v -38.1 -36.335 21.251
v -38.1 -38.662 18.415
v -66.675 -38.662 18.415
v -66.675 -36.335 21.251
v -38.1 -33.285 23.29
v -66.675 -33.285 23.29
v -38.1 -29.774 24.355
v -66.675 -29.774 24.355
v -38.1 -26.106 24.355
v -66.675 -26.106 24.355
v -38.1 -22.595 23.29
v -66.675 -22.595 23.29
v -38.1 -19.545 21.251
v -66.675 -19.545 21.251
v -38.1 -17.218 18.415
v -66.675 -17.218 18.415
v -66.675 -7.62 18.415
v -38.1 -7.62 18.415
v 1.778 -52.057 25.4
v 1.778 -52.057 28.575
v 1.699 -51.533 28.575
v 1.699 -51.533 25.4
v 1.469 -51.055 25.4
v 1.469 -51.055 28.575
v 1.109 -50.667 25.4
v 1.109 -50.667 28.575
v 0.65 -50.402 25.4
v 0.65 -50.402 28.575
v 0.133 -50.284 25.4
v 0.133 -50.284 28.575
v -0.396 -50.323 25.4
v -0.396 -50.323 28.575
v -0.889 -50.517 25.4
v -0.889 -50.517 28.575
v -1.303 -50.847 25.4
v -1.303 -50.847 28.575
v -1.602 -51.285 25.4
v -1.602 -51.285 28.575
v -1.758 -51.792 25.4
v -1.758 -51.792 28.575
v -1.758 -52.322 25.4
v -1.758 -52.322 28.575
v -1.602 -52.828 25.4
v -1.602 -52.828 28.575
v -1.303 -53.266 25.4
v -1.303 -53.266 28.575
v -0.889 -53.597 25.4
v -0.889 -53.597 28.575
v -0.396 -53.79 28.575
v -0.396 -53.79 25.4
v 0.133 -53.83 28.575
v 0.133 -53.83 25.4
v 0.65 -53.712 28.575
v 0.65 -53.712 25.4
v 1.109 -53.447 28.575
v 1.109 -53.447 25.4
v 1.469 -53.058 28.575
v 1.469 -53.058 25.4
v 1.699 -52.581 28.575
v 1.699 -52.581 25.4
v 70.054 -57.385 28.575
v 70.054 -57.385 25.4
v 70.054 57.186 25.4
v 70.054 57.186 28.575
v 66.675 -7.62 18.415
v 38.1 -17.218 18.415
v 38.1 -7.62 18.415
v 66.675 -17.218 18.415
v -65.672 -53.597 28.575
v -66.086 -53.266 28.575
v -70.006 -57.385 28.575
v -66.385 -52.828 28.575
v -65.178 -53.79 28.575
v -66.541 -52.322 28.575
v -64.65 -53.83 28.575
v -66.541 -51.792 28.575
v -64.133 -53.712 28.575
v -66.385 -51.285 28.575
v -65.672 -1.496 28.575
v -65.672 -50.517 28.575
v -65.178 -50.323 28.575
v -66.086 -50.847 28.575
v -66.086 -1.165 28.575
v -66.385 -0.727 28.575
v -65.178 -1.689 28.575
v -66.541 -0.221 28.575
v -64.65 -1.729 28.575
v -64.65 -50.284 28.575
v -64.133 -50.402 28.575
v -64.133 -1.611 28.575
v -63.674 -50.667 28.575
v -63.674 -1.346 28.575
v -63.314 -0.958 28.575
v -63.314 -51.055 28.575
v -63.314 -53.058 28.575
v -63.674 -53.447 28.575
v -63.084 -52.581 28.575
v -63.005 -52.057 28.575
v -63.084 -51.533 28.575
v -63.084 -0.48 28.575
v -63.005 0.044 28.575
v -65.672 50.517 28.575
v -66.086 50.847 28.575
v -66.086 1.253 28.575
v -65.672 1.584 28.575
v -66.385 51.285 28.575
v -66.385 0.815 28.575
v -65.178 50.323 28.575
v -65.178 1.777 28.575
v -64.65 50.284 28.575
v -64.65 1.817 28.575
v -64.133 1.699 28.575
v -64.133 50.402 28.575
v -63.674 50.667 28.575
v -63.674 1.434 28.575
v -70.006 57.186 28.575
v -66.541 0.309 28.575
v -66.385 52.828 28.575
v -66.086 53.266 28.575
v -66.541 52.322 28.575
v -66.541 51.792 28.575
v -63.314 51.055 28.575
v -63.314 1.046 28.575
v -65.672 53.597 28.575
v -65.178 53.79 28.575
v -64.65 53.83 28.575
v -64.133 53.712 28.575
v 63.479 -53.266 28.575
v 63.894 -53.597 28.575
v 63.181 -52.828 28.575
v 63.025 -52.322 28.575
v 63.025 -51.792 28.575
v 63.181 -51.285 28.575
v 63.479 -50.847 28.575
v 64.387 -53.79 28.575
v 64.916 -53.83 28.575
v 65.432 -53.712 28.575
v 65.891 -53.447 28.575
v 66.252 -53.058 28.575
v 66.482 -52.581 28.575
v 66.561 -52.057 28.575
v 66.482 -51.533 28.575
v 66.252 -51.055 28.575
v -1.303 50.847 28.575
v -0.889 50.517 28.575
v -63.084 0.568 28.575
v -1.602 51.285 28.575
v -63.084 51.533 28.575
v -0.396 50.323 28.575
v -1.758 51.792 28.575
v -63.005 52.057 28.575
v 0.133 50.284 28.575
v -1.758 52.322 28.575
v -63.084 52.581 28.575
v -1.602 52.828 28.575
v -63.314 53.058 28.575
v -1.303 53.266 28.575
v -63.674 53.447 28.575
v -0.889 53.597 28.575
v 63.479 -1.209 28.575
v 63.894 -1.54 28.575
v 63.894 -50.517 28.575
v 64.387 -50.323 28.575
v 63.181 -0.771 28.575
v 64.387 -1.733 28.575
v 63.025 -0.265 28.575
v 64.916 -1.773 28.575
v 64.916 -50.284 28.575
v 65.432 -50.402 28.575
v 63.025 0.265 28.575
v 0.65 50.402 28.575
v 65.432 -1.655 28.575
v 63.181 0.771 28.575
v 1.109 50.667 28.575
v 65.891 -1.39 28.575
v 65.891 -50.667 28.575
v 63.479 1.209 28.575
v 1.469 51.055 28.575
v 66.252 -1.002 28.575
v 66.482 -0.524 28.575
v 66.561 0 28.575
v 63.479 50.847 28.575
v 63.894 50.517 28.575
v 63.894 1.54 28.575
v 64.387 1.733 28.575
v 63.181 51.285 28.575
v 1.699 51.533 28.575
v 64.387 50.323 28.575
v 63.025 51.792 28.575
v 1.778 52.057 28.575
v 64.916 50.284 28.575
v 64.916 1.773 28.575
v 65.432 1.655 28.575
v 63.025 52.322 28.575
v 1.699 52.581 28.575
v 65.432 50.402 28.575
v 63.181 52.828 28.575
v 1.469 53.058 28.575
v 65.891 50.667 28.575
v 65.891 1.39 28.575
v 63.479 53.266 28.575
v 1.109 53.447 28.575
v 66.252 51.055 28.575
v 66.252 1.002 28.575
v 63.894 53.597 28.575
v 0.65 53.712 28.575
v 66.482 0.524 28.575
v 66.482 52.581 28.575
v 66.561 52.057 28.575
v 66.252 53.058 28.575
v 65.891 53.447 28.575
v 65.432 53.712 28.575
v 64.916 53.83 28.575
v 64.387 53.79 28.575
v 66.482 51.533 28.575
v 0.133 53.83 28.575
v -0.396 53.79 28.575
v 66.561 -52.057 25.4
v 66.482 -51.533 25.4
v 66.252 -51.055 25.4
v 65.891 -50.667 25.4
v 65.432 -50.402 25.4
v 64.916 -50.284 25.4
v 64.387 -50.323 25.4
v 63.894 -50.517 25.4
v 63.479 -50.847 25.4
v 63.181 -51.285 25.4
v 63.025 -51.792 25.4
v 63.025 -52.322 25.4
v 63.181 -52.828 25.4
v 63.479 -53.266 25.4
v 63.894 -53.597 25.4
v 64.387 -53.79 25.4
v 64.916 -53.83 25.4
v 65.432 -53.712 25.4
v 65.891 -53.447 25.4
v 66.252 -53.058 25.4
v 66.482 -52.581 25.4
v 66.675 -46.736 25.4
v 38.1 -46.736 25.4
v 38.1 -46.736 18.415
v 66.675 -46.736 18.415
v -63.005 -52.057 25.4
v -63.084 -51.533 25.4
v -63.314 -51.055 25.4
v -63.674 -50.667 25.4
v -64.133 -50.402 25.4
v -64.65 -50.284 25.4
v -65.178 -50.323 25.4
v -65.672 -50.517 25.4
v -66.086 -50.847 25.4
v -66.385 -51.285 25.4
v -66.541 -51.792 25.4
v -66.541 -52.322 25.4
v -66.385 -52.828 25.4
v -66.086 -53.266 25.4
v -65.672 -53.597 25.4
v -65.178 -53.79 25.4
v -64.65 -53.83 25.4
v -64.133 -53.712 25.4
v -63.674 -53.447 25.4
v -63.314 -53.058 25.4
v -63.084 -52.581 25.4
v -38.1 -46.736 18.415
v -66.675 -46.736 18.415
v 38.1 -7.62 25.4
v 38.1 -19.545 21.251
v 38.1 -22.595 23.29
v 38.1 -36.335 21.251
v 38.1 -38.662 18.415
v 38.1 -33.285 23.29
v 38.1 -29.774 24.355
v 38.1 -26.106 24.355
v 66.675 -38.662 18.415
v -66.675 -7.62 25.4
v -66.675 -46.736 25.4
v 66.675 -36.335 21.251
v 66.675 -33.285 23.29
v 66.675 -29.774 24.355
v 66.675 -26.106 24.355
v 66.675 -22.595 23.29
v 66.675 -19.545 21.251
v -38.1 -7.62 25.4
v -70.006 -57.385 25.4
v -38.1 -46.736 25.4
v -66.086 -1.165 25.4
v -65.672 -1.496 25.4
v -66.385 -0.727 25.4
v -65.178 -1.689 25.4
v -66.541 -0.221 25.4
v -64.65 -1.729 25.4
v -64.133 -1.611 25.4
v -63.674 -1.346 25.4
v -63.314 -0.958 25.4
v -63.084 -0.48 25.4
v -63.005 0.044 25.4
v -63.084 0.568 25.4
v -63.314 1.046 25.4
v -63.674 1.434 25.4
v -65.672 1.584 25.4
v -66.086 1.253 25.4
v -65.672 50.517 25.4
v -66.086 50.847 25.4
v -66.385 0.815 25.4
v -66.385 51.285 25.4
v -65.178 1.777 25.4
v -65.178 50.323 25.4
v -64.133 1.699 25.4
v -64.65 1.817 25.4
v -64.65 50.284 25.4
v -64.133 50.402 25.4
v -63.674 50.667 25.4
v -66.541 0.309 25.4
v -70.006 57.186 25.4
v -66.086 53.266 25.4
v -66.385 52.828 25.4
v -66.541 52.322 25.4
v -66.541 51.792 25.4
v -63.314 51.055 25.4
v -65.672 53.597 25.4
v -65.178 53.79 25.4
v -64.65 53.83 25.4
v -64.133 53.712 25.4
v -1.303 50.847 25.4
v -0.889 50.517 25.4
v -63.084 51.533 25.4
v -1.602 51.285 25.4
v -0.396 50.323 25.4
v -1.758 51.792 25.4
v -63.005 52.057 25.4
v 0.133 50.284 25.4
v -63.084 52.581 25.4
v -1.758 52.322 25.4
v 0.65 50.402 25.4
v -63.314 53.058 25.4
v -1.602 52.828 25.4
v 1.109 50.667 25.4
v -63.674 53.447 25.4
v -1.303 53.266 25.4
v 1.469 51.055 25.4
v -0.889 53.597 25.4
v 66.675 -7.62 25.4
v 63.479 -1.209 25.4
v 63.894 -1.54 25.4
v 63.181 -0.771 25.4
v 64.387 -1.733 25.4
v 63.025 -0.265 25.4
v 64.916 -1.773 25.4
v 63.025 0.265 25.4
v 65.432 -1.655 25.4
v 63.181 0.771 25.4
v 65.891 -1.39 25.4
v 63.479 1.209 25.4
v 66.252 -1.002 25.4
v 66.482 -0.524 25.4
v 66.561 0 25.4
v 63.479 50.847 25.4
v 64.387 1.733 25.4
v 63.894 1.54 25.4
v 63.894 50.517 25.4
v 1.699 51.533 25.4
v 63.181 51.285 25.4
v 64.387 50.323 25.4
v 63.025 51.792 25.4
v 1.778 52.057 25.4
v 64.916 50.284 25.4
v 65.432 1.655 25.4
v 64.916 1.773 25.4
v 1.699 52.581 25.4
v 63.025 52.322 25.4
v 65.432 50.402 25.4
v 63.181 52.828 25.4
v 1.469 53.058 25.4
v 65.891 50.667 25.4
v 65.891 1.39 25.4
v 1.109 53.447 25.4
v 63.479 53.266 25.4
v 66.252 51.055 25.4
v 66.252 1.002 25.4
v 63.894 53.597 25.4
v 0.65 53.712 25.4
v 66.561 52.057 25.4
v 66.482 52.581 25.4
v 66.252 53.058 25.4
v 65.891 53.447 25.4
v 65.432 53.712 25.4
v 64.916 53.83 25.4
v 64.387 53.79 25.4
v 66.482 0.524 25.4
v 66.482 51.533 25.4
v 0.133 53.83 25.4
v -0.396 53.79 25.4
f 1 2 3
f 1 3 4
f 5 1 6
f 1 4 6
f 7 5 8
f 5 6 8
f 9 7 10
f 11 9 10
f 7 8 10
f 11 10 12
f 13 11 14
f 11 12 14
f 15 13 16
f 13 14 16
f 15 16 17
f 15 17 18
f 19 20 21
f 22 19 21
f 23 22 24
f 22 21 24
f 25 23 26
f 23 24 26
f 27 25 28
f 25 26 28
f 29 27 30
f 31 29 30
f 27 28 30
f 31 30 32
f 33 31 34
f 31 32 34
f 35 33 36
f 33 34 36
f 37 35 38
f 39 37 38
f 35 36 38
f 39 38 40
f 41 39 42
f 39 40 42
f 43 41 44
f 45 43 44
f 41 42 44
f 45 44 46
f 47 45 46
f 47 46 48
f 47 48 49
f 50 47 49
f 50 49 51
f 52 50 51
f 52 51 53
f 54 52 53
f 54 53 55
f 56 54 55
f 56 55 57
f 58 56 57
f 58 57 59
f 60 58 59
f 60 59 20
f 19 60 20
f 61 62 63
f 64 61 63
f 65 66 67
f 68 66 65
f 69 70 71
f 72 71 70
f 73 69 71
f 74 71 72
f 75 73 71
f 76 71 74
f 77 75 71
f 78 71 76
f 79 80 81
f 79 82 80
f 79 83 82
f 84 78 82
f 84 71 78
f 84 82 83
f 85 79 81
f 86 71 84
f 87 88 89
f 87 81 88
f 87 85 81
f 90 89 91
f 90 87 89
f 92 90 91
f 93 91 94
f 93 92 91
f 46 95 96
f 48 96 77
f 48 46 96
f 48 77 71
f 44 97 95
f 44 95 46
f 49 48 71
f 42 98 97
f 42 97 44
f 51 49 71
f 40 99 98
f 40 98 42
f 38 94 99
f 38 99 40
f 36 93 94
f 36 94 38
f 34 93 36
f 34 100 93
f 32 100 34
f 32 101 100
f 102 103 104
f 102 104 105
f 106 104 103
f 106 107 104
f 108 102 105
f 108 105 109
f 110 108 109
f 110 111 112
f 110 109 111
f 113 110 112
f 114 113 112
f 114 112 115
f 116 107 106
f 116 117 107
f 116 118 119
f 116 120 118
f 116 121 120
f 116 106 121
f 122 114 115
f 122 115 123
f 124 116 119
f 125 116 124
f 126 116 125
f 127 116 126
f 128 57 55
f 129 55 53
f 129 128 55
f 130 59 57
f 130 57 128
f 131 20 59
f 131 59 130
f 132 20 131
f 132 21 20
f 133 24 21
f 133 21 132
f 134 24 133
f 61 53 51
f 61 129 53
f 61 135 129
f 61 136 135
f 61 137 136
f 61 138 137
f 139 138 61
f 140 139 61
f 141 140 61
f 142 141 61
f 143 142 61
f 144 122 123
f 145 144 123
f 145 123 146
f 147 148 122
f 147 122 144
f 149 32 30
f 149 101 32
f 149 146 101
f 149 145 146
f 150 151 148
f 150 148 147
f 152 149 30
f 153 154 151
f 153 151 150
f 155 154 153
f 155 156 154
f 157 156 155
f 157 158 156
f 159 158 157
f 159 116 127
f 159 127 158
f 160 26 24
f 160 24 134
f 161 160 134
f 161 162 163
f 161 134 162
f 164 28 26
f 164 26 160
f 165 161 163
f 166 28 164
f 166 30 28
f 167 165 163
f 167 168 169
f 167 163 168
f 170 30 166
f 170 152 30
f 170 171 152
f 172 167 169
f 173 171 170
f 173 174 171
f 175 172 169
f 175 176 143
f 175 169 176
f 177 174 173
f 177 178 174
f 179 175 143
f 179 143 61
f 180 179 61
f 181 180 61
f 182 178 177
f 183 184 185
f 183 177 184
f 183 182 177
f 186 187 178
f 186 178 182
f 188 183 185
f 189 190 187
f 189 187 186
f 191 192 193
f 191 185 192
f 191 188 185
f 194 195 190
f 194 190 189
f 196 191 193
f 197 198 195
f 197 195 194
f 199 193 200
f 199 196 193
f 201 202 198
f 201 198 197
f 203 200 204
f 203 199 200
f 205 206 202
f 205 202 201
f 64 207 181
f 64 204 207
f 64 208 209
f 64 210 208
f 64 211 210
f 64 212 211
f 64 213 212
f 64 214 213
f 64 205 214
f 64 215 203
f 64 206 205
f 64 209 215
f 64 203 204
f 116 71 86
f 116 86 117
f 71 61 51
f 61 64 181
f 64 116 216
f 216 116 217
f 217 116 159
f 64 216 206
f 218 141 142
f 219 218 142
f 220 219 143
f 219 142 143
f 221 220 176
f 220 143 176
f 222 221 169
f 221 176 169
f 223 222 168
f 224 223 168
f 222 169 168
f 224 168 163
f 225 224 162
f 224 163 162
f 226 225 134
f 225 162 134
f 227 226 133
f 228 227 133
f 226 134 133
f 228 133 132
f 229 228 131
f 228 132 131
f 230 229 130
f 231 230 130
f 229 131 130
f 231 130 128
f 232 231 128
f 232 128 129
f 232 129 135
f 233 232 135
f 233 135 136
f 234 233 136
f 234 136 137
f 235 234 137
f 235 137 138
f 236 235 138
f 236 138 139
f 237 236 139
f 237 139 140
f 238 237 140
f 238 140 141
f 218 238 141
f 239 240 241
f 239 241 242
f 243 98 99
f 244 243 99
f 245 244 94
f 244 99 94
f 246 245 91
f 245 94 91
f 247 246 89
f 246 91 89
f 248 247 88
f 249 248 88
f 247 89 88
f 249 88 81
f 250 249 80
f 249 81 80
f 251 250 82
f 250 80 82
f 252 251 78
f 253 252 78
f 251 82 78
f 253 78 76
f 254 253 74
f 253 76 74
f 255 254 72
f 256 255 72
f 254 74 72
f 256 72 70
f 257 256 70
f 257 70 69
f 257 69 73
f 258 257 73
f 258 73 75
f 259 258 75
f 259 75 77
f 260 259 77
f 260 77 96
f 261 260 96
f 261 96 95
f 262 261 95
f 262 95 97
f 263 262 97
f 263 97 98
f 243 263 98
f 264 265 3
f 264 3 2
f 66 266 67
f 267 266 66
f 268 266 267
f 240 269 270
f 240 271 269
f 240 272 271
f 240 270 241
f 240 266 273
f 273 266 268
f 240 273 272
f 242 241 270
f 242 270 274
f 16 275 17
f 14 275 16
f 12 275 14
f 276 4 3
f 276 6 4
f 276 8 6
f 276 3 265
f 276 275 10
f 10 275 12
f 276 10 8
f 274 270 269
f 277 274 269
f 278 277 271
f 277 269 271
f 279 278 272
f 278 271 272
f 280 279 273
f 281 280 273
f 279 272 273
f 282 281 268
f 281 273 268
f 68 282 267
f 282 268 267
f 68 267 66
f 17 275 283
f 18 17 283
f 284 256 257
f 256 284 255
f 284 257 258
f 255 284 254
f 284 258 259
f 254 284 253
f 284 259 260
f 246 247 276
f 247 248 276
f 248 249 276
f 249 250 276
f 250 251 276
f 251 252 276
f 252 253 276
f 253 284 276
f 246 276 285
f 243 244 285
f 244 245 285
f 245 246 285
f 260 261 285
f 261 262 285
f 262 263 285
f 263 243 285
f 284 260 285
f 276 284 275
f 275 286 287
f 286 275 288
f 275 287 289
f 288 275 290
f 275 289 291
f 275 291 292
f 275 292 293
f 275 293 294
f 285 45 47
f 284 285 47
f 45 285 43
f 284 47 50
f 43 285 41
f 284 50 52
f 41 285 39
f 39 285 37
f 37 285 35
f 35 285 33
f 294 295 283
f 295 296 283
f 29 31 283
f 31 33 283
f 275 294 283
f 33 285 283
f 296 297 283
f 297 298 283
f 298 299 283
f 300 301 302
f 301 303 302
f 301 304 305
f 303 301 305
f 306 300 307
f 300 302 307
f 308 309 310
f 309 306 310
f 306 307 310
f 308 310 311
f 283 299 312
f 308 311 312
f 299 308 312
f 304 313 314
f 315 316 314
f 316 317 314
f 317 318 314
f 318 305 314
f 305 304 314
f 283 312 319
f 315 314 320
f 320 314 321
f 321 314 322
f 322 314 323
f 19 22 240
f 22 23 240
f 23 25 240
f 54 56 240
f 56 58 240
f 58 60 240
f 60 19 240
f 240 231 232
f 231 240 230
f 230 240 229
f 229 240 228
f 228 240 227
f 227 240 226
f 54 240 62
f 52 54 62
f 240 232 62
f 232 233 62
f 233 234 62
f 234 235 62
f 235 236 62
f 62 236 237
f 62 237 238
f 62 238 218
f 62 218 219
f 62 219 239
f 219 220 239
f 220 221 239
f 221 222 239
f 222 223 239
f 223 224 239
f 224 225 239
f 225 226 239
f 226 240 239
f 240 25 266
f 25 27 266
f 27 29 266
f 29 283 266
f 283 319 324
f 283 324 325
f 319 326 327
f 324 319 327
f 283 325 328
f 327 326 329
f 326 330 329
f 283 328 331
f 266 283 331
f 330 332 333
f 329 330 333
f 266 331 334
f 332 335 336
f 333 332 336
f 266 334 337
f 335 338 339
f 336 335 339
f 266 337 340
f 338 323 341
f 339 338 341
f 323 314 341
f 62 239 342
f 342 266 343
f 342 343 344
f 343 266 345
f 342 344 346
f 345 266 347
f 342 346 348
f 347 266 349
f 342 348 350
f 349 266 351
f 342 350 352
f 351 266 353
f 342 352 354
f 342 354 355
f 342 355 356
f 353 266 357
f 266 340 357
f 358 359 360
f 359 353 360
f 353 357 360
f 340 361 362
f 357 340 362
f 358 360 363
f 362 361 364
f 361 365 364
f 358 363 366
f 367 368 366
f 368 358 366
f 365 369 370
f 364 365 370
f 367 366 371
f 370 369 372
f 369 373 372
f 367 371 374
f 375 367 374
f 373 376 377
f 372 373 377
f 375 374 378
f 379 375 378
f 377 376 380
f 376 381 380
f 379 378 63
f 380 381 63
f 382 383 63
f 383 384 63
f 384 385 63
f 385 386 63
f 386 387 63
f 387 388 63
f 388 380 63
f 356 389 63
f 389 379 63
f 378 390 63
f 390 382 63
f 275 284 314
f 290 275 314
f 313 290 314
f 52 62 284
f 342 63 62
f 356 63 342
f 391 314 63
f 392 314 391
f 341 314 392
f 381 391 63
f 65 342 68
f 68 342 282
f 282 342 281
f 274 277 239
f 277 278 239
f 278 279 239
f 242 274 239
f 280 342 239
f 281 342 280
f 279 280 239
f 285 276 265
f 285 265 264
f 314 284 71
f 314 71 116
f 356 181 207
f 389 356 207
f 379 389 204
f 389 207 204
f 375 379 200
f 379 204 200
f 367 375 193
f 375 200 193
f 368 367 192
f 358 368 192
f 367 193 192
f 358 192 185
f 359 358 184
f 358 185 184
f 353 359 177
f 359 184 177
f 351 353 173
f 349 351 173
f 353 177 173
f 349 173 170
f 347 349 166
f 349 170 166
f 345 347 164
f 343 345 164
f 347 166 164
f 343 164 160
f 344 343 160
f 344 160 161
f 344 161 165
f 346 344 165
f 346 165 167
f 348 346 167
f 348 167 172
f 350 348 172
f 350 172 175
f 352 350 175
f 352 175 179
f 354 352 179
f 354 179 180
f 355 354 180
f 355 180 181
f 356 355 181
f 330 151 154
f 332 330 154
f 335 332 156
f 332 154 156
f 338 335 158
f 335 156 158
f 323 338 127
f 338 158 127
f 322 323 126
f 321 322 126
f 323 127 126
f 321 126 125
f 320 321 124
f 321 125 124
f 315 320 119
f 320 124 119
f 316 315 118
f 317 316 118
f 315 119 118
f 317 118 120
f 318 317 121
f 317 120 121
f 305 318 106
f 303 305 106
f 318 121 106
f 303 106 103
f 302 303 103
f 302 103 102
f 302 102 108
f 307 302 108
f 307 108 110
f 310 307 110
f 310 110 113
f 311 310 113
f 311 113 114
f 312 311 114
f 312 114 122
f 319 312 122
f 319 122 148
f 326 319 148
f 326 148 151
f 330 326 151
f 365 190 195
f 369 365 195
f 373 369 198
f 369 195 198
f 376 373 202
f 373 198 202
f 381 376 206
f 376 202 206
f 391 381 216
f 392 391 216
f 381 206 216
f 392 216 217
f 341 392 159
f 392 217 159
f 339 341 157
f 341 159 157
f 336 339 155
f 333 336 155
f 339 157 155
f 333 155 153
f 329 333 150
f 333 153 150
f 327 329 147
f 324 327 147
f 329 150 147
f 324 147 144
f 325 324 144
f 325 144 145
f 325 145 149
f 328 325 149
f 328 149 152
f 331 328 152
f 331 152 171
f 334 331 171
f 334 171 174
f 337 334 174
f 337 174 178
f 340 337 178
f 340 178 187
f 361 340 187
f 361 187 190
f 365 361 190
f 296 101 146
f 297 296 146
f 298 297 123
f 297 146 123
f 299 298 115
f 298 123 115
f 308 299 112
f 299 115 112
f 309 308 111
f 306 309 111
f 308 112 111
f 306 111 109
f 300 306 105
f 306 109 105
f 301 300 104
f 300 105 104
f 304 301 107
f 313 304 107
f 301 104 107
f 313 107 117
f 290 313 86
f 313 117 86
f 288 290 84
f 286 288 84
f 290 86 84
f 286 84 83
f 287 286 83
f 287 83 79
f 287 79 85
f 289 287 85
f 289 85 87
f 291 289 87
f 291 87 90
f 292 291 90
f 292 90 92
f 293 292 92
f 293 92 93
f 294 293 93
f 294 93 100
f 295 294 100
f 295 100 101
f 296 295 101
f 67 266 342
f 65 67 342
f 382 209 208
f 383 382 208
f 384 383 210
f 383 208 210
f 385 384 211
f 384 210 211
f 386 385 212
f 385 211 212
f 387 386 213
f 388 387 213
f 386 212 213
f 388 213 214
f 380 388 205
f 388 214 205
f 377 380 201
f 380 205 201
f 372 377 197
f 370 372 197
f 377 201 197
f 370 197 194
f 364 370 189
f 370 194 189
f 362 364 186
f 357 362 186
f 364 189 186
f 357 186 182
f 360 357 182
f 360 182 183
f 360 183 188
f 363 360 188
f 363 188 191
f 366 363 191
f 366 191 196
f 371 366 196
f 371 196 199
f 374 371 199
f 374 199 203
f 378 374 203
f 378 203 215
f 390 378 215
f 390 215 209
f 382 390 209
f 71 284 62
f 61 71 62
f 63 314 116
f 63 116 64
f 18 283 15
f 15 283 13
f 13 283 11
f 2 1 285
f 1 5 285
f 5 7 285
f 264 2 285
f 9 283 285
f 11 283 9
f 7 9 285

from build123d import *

# Parameters (mm, degrees)
SKETCH009_W     = 140.059471
SKETCH009_H     = 114.571171
PAD008_DEPTH    = 3.175
SKETCH013_R     = 1.778
POCKET003_DEPTH = 5.00126
SKETCH020_W     = 133.35
SKETCH020_H     = 39.116
PAD012_DEPTH    = 6.985
SKETCH021_R     = 12.49934
POCKET007_DEPTH = 136.729619
SKETCH022_W     = 76.2
SKETCH022_H     = 43.18
POCKET008_DEPTH = 8.89


with BuildPart() as part:
    # Sketch009 (on Face1 of ReferencePad006) → Pad008 (new body)
    with BuildSketch(Plane.XY.offset(25.4)):
        with Locations((0.023884, -0.09941)):
            Rectangle(SKETCH009_W, SKETCH009_H)
    extrude(amount=PAD008_DEPTH)

    # Sketch013 (on Face6 of Pad008) → Pocket003 (cut)
    with BuildSketch(Plane.XY.offset(28.575)):
        with Locations((64.782738, 52.056831)):
            Circle(SKETCH013_R)
        with Locations((64.782738, 0)):
            Circle(SKETCH013_R)
        with Locations((64.782738, -52.056831)):
            Circle(SKETCH013_R)
        with Locations((0, 52.056831)):
            Circle(SKETCH013_R)
        with Locations((-64.782738, 52.056831)):
            Circle(SKETCH013_R)
        with Locations((-64.782738, 0.043989)):
            Circle(SKETCH013_R)
        with Locations((-64.782738, -52.056831)):
            Circle(SKETCH013_R)
        with Locations((0, -52.056831)):
            Circle(SKETCH013_R)
    extrude(amount=-POCKET003_DEPTH, mode=Mode.SUBTRACT)

    # Sketch020 (on Face5 of Pad008) → Pad012 (join)
    with BuildSketch(Plane(origin=(0, 0, 25.4), x_dir=(1, 0, 0), z_dir=(0, 0, -1))):
        with Locations((0, 27.178)):
            Rectangle(SKETCH020_W, SKETCH020_H)
    extrude(amount=PAD012_DEPTH)

    # Sketch021 (on Face12 of Pad012) → Pocket007 (cut, through all)
    with BuildSketch(Plane(origin=(-66.675, 0, 0), x_dir=(0, -1, 0), z_dir=(-1, 0, 0))):
        with Locations((27.94, 11.99134)):
            Circle(SKETCH021_R)
    extrude(amount=-POCKET007_DEPTH, mode=Mode.SUBTRACT)

    # Sketch022 (on Face4 of Pocket007) → Pocket008 (cut)
    with BuildSketch(Plane(origin=(0, 0, 25.4), x_dir=(1, 0, 0), z_dir=(0, 0, -1))):
        with Locations((0, 27.94)):
            Rectangle(SKETCH022_W, SKETCH022_H)
    extrude(amount=POCKET008_DEPTH, mode=Mode.SUBTRACT)


solid = part.part
